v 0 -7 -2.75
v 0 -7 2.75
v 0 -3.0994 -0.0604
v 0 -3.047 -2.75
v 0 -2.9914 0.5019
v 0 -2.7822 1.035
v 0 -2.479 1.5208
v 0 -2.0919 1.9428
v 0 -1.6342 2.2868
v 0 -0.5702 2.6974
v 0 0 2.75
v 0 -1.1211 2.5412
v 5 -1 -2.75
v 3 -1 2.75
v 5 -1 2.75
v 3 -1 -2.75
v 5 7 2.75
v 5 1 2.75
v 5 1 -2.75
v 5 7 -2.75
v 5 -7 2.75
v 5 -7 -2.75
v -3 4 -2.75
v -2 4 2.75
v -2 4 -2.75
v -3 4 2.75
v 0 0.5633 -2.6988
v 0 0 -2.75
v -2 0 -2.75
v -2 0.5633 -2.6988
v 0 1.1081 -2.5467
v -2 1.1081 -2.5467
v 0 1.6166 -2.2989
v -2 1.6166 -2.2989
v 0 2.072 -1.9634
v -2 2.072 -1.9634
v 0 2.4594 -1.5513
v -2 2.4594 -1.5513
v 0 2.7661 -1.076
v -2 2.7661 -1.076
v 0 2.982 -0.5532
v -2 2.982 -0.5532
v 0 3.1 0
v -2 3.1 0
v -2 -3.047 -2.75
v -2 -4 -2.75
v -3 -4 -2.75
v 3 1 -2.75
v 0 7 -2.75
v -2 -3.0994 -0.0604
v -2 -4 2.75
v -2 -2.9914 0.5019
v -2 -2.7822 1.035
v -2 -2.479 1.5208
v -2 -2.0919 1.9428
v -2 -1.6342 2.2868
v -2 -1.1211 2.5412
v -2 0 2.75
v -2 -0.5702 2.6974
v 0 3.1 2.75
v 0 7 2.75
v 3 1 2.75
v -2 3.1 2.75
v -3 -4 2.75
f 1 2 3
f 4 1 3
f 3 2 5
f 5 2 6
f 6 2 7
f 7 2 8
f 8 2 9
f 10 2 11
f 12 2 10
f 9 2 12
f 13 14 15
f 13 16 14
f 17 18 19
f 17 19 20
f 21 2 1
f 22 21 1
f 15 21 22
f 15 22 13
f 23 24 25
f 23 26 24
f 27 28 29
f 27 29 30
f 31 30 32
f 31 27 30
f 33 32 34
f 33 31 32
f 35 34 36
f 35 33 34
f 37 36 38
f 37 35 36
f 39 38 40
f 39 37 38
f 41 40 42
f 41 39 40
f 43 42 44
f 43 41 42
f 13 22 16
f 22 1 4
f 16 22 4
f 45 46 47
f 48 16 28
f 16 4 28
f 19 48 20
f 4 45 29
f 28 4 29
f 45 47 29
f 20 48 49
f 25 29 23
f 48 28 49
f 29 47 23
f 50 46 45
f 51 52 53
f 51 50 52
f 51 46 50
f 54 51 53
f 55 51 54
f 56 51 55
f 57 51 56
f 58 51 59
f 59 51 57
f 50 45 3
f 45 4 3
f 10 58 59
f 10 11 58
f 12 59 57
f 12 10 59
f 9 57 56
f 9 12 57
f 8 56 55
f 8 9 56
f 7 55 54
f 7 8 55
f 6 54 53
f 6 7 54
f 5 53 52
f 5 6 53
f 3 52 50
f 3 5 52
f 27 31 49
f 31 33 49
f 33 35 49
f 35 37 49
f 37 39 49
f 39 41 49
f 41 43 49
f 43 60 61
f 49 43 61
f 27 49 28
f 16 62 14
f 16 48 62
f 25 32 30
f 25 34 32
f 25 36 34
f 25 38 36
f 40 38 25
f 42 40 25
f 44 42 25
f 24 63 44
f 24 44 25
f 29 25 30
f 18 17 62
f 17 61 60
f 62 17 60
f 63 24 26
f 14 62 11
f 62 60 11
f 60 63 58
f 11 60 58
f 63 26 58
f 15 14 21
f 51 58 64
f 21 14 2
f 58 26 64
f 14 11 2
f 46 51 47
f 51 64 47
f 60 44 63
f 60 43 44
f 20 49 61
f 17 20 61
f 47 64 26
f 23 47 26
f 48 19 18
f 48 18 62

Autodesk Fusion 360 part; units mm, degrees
ref_plane "WorkPlane1" through (11.25, 0, 0) normal (1, 0, 0) x (0, 1, 0)
sketch "wire_screw2" plane through (0, 0, 0) normal (1, 0, 0) x (0, 1, 0)
  line L0 (7, 3.1) -> (-7, -3.1) construction
  line L1 (-7, 3.1) -> (7, -3.1) construction
  line L2 (-4, 4) -> (-4, -3.4897)
  line L3 (4, 4) -> (4, -3.5621)
  circle A0 centre (0, 0) radius 3.1
  circle A1 centre (0, 0) radius 2.75
  line L4 (-3.0288, -3.6864) -> (-3.0994, -0.0604)
  arc A2 (0, 2.75) -> (-3.0994, -0.0604) centre (0, -0.3643) ccw
  arc A3 (0, -2.75) -> (0, 2.75) centre (0, 0) ccw
  arc A4 (0, -2.75) -> (3.1, 0) centre (0, 0.3723) ccw
  line L5 (3.1, 0) -> (3.1, 3.8294)
  line L6 (0, 2.75) -> (3.1, 2.75)
  line L7 (0, -2.75) -> (-3.047, -2.75)
  line L8 (0, 2.75) -> (7, 2.75)
  line L9 (7, 2.75) -> (-7, 2.75)
  line L10 (-7, 2.75) -> (-7, -2.75)
  line L11 (-7, -2.75) -> (7, -2.75)
  line L12 (7, -2.75) -> (7, 2.75)
  dimension "d38" = 14
  dimension "d39" = 6.2
  dimension "d40" = 5.5
  dimension "d41" = 7
  dimension "d42" = 14
extrude "Extrude7" add sketch "wire_screw2" along normal blind -2 and the other way blind 3 contours L2 A0 L4 L9 L11 | A0 A2 L9 | A0 L4 L7 L11 | A0 L5 L6 L8 L9 | A0 A1 A3 A4 L6 L8 L9 | A0 A1 A2 L7 L11 | A1 A3 | L3 A0 L5 L8 L9 L11 | A0 A4 L11
extrude "Extrude8" add sketch "wire_screw2" against normal blind 2 contours A0 L4 L7 L11 | A0 L5 L6 L8 L9 | A0 A1 A3 A4 L6 L8 L9 | A0 A1 A2 L7 L11 | A1 A3
extrude "Extrude9" add sketch "wire_screw2" along normal blind 5 contours L2 A0 L4 L9 L11 | L2 L9 L10 L11 | A0 A2 L9 | A0 L4 L7 L11 | A0 L5 L6 L8 L9 | A0 A1 A3 A4 L6 L8 L9 | A0 A1 A2 L7 L11 | A1 A3 | L3 A0 L5 L8 L9 L11 | A0 A4 L11 | L3 L8 L9 L11 L12
sketch "wire_screw2_slot" plane through (0, 0, -2.75) normal (0, 0, -1) x (1, 0, 0)
  line L0 (-2, -4) -> (-2, 0)
  line L1 (-2, 0) -> (0, 0)
  line L2 (0, 0) -> (0, -7)
  line L3 (0, -7) -> (5, -7)
  line L4 (5, -7) -> (5, 7)
  line L5 (5, 7) -> (0, 7)
  line L6 (0, 7) -> (0, 3.047)
  line L7 (0, 3.047) -> (-2, 3.047)
  line L8 (-2, 3.047) -> (-2, 4)
  line L9 (-2, 4) -> (-3, 4)
  line L10 (-3, 4) -> (-3, -4)
  line L11 (-3, -4) -> (-2, -4)
  line L12 (3, 1) -> (7, 1)
  line L13 (7, 1) -> (7, -1)
  line L14 (7, -1) -> (3, -1)
  line L15 (3, -1) -> (3, 1)
  line L16 (3, 1) -> (7, -1) construction
  line L17 (7, 1) -> (3, -1) construction
  point P0 (5, 0)
  dimension "d51" = 4
  dimension "d52" = 2
extrude "Extrude10" cut sketch "wire_screw2_slot" against normal blind 8 contours L4 L12 L14 L15
